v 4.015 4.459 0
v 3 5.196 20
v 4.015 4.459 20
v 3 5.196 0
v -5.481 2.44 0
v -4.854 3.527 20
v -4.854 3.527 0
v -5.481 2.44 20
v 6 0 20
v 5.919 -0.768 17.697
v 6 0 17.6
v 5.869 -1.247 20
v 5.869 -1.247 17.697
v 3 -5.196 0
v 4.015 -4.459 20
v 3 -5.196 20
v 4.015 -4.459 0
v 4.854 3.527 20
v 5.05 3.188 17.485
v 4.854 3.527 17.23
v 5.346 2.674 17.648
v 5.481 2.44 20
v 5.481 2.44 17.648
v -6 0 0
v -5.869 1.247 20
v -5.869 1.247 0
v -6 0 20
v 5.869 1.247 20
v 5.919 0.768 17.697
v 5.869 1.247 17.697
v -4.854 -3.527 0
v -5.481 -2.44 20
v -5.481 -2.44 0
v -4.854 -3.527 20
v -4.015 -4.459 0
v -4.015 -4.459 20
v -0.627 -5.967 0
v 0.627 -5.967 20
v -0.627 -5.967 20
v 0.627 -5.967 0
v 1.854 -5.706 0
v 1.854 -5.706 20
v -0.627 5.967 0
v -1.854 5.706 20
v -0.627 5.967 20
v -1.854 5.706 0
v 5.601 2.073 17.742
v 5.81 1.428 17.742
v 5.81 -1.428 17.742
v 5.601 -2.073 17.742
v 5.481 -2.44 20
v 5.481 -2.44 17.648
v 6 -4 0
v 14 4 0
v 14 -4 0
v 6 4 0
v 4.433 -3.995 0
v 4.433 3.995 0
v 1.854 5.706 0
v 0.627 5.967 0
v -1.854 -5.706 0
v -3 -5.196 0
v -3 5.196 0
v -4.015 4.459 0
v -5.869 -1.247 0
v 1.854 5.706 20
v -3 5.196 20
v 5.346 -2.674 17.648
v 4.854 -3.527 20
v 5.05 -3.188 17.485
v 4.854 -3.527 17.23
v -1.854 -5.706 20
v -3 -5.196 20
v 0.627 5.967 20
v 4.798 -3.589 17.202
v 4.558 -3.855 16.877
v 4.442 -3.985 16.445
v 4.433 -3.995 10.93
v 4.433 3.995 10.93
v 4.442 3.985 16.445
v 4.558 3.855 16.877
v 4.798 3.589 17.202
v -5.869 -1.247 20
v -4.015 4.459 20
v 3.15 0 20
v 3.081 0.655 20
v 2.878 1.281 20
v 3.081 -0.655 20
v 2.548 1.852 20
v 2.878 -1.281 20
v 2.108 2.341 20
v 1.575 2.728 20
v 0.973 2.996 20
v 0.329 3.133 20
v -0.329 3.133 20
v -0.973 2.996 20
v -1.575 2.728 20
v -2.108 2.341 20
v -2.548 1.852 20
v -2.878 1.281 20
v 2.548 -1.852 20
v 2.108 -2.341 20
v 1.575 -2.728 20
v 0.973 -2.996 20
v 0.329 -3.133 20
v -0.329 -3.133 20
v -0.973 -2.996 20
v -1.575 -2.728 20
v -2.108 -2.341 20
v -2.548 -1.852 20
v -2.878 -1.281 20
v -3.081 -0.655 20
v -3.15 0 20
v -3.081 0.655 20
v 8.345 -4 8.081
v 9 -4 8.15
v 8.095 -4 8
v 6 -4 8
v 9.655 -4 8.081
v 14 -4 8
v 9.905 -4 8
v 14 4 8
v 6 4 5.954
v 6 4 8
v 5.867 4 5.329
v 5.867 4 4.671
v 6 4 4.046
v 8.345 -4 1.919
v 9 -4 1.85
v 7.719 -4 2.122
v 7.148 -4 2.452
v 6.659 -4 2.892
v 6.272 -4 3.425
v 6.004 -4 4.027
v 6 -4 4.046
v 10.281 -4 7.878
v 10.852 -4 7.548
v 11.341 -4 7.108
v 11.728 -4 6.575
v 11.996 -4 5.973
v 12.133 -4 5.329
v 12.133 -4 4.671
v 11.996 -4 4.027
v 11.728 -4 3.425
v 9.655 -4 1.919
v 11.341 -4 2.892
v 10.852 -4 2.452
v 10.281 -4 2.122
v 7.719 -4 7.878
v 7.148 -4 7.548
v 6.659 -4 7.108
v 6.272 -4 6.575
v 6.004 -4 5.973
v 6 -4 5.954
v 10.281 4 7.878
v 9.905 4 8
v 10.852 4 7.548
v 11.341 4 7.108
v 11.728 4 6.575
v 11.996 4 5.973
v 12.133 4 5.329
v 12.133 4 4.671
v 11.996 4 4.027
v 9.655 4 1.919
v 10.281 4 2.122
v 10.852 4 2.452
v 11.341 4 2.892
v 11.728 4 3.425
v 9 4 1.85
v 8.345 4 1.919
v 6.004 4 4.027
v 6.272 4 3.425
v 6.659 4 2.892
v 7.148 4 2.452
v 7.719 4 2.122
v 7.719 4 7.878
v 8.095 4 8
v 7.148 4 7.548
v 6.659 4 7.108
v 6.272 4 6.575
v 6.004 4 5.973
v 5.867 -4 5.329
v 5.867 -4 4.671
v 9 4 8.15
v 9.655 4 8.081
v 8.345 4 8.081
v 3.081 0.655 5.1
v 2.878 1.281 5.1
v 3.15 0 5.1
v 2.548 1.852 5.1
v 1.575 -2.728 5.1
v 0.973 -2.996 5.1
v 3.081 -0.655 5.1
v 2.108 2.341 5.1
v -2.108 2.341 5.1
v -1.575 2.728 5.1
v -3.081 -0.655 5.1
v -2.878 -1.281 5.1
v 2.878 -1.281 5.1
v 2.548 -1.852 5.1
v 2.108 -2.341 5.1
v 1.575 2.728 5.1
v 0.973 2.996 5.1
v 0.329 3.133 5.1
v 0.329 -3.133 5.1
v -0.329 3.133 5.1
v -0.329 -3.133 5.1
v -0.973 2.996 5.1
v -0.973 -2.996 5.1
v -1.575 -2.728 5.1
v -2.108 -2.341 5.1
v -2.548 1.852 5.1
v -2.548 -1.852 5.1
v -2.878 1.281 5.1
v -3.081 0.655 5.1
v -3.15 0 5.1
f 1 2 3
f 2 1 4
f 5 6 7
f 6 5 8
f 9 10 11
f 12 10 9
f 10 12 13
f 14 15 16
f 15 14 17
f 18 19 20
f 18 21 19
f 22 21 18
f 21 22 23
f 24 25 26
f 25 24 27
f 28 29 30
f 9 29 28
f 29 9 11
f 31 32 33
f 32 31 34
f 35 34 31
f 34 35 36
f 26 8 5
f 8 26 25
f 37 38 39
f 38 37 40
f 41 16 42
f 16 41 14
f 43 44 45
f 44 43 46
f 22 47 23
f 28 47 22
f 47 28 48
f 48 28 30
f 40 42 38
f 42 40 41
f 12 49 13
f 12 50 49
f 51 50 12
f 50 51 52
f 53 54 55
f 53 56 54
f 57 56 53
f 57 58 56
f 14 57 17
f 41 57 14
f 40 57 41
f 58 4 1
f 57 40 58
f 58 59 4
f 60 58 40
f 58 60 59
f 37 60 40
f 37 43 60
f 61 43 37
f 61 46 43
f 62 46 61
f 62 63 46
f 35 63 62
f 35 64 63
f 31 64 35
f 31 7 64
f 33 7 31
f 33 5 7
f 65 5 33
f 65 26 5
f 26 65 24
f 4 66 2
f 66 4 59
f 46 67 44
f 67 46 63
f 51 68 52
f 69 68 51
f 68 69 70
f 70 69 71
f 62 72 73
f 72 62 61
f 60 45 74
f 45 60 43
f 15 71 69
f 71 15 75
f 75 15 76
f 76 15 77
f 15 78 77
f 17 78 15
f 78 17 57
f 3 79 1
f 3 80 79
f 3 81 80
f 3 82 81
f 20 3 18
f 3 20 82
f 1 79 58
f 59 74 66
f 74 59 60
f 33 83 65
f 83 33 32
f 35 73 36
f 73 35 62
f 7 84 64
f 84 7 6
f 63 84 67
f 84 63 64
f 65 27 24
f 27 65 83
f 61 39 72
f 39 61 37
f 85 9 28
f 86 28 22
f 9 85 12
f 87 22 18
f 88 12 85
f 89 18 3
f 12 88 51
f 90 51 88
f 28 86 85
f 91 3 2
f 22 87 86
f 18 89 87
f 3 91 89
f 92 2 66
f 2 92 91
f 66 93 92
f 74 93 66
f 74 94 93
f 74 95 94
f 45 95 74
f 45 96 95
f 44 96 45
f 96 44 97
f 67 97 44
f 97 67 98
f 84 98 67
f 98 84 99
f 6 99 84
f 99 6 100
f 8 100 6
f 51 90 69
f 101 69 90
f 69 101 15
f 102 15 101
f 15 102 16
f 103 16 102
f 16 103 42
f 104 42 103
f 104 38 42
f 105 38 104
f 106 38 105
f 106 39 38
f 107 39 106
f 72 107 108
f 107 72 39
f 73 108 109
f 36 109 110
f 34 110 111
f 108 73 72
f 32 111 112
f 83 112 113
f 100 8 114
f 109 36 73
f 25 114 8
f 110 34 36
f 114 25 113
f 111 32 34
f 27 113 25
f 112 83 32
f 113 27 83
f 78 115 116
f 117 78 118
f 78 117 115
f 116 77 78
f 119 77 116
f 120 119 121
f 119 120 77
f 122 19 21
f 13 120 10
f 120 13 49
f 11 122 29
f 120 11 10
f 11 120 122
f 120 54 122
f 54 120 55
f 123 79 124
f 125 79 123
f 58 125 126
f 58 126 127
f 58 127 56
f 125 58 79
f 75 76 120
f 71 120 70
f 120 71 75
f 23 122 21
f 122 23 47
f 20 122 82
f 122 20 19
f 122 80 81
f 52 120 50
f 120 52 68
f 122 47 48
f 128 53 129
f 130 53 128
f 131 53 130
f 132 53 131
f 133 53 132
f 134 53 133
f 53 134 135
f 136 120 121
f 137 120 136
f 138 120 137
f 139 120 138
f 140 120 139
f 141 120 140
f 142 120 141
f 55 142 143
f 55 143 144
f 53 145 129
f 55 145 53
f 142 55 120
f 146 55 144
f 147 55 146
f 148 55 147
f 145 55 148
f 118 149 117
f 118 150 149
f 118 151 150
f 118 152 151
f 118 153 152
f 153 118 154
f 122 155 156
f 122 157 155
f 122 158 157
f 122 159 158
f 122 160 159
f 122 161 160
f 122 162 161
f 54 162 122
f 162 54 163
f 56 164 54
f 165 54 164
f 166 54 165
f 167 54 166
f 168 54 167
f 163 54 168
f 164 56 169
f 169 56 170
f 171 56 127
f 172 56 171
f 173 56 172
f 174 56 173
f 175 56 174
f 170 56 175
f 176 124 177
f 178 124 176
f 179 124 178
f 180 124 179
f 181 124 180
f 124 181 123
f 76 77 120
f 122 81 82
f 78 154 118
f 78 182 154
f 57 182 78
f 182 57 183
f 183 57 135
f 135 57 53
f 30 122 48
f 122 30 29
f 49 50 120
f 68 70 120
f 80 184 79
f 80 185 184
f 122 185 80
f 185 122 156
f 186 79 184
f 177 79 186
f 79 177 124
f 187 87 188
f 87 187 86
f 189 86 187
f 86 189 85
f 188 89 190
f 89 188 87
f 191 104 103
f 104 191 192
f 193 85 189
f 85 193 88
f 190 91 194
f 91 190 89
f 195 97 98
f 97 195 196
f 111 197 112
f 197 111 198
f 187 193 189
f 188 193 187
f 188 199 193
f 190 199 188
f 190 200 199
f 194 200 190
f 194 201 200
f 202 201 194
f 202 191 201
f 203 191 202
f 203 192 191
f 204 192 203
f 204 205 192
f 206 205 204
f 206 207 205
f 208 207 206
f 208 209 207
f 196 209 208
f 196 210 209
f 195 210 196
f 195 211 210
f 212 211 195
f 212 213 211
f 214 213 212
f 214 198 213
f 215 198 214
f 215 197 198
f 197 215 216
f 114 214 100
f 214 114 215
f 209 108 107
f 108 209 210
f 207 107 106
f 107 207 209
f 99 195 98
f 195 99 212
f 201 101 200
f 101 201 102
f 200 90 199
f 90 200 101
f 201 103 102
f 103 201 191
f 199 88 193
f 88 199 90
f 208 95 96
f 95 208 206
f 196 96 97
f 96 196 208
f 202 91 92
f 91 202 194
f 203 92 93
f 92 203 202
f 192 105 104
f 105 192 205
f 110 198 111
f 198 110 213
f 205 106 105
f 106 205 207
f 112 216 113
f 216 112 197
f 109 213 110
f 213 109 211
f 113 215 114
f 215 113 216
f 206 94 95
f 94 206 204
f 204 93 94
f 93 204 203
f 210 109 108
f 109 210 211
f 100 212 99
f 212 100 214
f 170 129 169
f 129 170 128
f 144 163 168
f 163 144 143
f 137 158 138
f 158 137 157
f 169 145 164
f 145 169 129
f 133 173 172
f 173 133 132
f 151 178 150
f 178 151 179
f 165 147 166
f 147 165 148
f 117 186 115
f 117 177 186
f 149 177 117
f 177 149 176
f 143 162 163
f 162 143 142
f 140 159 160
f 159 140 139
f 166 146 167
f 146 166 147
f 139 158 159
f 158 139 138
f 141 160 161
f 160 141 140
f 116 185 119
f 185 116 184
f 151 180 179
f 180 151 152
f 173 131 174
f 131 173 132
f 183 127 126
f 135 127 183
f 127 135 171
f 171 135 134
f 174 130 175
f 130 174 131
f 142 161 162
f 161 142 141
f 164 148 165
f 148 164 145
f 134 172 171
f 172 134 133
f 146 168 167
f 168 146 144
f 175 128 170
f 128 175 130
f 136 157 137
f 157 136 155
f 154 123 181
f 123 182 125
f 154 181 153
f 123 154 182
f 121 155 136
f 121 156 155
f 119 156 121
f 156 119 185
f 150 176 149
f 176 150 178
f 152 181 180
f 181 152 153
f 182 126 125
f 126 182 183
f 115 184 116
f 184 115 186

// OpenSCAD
screw_diam = 5.8;
$fn=30;

translate([0,0,10]) {
  difference() {
    union() {
      cylinder(r=6, h=20, center=true);
      hull() {
        cylinder(r=4, h=20, center=true);
        // translate([10,0,-6]) rotate([90,90,0]) cylinder(r=4, h=8, center=true);
        translate([10,0,-6]) cube(size=[8, 8, 8], center=true);
      }
    }

    translate([0,0,5.1]) cylinder(r=screw_diam/2+0.25, h=20, center=true);
    translate([9,0,-5]) rotate([90,90,0]) cylinder(r=screw_diam/2 + 0.25, h=11, center=true);
  }
}



*rotate([0,-90,0]) {
  difference() {
    union() {
      hull() {
        translate([9,0,-5]) cube(size=[10, 18, 10], center=true);
        translate([9,0,-50]) cube(size=[10, 40, 30], center=true);
      }
      translate([9,-6.5,0]) cube(size=[10, 5, 20], center=true);
      translate([9,6.5,0]) cube(size=[10, 5, 20], center=true);
      translate([24.5,0,-45]) rotate([0,90,0]) cylinder(r=6, h=21, center=true);
    }
    translate([9,0,5]) rotate([90,90,0]) cylinder(r=screw_diam/2, h=30, center=true);
    translate([9,0,-45]) rotate([0,90,0]) cylinder(r=screw_diam/2+0.5, h=80, center=true);
  }
}
